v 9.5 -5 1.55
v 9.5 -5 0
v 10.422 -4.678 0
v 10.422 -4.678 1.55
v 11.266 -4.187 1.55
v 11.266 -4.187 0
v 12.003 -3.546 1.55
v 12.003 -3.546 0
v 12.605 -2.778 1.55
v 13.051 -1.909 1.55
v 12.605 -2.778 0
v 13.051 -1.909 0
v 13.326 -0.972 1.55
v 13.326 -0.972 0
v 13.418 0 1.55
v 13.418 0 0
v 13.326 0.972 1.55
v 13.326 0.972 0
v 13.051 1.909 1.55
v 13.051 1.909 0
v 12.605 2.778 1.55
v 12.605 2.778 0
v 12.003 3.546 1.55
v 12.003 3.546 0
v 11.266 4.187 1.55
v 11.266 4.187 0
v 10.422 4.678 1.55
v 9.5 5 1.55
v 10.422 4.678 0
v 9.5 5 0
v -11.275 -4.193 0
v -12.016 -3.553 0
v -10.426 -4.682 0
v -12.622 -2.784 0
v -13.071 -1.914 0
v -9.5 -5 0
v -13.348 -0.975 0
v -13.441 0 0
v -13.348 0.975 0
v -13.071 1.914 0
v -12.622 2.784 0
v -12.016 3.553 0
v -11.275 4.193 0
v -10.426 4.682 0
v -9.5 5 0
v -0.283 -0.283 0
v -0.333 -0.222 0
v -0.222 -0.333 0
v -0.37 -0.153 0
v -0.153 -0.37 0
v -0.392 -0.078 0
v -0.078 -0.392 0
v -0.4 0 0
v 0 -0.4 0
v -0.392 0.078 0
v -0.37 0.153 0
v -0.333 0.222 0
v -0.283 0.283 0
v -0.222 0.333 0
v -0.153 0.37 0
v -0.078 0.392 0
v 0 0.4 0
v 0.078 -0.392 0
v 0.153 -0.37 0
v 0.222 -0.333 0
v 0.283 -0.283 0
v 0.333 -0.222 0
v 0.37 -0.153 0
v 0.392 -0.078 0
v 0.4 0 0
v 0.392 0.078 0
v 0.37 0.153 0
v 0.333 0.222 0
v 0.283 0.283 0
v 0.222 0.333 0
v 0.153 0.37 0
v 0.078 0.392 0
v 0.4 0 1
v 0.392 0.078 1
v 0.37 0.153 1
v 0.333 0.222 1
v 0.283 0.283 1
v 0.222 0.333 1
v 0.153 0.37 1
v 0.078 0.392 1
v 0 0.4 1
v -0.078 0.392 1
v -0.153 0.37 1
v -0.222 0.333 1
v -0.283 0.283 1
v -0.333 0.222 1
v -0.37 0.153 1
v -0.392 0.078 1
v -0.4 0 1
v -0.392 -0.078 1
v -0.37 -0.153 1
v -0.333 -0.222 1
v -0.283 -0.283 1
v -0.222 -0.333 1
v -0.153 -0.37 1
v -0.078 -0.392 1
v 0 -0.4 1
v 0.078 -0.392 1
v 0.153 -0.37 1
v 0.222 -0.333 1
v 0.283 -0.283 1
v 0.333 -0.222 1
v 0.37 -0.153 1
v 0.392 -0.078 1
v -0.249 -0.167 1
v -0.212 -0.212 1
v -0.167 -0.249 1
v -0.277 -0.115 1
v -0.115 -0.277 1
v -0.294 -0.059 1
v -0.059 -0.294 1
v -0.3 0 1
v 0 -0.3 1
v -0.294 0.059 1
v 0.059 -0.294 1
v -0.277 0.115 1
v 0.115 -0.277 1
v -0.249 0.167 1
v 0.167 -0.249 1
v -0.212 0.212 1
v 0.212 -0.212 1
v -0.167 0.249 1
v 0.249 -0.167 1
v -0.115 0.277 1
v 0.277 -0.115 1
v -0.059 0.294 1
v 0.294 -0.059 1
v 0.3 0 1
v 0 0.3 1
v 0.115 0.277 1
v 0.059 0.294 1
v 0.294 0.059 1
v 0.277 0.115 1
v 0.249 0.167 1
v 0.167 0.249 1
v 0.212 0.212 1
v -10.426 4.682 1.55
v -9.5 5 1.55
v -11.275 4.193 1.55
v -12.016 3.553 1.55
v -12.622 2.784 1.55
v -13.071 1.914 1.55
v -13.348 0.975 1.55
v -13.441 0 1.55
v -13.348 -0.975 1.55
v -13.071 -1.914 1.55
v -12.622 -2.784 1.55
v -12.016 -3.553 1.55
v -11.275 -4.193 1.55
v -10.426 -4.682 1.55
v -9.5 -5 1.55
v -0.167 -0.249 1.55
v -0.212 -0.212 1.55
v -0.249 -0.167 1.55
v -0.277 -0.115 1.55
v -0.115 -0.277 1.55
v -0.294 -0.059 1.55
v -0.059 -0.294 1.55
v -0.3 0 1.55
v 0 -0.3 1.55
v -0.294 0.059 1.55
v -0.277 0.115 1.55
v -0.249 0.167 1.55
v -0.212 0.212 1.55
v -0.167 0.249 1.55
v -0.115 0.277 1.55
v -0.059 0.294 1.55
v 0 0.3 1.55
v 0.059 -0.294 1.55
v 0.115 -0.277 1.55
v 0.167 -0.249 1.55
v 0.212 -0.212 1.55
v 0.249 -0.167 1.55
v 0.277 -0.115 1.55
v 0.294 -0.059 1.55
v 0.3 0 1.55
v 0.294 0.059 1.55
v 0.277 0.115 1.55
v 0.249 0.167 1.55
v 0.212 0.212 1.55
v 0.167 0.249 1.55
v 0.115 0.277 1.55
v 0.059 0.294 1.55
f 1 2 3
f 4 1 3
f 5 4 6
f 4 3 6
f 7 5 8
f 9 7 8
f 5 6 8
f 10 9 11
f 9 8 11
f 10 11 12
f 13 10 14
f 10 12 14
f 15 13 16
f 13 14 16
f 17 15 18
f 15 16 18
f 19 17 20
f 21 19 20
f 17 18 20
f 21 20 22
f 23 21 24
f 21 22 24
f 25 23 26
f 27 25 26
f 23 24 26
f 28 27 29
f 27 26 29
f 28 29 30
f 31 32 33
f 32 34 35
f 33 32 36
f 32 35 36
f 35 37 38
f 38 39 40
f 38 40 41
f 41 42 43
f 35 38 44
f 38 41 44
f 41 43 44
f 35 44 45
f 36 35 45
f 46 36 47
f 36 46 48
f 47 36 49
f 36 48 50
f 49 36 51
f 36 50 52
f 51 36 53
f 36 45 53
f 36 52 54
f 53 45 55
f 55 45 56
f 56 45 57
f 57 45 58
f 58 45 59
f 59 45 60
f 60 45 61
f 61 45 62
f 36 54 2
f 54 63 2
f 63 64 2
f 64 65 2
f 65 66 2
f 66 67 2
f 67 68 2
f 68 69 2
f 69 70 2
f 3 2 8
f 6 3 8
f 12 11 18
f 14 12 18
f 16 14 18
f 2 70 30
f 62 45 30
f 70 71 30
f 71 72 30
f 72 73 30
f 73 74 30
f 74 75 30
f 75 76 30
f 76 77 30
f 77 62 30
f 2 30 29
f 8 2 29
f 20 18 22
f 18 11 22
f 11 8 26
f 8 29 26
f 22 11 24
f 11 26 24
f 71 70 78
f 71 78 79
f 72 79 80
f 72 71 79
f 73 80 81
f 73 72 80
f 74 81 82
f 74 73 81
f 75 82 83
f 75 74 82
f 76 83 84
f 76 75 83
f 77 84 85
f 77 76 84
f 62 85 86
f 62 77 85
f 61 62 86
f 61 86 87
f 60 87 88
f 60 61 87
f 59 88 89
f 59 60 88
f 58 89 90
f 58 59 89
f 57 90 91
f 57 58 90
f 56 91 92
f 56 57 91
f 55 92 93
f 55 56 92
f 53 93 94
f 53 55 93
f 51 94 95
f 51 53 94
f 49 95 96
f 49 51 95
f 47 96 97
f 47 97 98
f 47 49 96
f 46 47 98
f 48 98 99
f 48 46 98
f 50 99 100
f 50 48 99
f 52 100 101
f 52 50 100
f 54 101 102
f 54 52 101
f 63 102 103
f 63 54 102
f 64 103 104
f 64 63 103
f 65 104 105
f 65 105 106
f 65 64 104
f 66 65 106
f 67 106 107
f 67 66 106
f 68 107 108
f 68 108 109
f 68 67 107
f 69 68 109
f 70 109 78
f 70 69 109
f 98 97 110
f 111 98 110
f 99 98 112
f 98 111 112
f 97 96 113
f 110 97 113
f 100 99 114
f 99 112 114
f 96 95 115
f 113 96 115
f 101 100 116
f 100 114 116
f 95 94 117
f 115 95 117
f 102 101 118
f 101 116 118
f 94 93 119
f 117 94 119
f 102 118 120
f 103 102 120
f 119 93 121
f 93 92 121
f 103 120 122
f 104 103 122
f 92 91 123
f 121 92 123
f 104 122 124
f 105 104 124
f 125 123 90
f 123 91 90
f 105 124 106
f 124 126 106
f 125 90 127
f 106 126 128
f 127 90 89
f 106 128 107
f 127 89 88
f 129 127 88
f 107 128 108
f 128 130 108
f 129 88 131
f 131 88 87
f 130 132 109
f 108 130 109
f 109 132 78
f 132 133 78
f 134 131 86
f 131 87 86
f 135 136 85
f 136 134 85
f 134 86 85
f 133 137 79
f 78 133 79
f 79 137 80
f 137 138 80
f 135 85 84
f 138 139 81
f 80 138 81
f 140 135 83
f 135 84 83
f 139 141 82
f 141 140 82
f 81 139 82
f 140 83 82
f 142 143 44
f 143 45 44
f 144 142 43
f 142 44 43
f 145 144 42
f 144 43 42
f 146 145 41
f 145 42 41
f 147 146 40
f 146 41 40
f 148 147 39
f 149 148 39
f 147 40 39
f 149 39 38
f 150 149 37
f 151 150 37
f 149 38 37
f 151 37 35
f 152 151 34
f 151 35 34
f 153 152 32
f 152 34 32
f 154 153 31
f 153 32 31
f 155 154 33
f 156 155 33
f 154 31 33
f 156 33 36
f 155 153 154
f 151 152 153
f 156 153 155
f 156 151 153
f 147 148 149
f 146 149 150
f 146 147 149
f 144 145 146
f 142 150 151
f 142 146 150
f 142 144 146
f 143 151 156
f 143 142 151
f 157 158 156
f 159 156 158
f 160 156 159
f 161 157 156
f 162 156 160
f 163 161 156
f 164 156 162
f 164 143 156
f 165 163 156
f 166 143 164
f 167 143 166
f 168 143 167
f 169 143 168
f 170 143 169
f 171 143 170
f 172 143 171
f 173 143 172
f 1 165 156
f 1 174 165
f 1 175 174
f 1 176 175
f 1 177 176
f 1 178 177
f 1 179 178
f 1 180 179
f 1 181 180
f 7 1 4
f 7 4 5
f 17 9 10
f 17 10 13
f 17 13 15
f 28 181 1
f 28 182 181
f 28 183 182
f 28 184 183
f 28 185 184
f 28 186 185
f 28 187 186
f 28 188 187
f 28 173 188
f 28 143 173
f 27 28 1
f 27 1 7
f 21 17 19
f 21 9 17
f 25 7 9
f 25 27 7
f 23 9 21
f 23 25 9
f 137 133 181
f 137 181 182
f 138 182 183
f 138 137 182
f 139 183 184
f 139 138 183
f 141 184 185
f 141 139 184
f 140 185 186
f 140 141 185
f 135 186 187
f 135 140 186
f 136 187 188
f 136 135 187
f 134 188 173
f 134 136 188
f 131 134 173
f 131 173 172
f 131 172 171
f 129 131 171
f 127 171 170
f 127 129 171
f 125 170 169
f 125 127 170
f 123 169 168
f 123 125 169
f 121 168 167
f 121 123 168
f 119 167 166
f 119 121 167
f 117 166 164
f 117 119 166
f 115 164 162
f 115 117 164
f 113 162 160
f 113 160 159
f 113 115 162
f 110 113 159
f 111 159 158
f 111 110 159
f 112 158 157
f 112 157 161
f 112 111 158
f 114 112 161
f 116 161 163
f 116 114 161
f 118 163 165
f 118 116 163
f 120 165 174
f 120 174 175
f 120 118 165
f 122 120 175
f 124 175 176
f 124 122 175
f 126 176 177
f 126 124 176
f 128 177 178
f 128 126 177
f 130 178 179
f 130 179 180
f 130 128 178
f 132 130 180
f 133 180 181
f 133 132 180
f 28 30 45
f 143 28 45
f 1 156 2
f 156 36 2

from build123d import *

# Parameters (mm, degrees)
F0_R     = 0.4
F1_DEPTH = 1
F2_R     = 0.3
F3_DEPTH = 0.55


with BuildPart() as f1:
    # F0 (on Top) → F1 (new body)
    with BuildSketch(Plane.XY):
        with BuildLine():
            Line((-9.5, -5), (9.5, -5))
            ThreePointArc((9.5, -5), (13.418354, 0), (9.5, 5))
            Line((9.5, 5), (-9.5, 5))
            ThreePointArc((-9.5, 5), (-13.44077, 0), (-9.5, -5))
        make_face()
        Circle(F0_R, mode=Mode.SUBTRACT)
    extrude(amount=F1_DEPTH)

    # F2 (on face) → F3 (join)
    with BuildSketch(Plane.XY.offset(1)):
        with BuildLine():
            Line((9.5, 5), (-9.5, 5))
            ThreePointArc((-9.5, 5), (-13.44077, 0), (-9.5, -5))
            Line((-9.5, -5), (9.5, -5))
            ThreePointArc((9.5, -5), (13.418354, 0), (9.5, 5))
        make_face()
        Circle(F2_R, mode=Mode.SUBTRACT)
    extrude(amount=F3_DEPTH)


solid = f1.part
